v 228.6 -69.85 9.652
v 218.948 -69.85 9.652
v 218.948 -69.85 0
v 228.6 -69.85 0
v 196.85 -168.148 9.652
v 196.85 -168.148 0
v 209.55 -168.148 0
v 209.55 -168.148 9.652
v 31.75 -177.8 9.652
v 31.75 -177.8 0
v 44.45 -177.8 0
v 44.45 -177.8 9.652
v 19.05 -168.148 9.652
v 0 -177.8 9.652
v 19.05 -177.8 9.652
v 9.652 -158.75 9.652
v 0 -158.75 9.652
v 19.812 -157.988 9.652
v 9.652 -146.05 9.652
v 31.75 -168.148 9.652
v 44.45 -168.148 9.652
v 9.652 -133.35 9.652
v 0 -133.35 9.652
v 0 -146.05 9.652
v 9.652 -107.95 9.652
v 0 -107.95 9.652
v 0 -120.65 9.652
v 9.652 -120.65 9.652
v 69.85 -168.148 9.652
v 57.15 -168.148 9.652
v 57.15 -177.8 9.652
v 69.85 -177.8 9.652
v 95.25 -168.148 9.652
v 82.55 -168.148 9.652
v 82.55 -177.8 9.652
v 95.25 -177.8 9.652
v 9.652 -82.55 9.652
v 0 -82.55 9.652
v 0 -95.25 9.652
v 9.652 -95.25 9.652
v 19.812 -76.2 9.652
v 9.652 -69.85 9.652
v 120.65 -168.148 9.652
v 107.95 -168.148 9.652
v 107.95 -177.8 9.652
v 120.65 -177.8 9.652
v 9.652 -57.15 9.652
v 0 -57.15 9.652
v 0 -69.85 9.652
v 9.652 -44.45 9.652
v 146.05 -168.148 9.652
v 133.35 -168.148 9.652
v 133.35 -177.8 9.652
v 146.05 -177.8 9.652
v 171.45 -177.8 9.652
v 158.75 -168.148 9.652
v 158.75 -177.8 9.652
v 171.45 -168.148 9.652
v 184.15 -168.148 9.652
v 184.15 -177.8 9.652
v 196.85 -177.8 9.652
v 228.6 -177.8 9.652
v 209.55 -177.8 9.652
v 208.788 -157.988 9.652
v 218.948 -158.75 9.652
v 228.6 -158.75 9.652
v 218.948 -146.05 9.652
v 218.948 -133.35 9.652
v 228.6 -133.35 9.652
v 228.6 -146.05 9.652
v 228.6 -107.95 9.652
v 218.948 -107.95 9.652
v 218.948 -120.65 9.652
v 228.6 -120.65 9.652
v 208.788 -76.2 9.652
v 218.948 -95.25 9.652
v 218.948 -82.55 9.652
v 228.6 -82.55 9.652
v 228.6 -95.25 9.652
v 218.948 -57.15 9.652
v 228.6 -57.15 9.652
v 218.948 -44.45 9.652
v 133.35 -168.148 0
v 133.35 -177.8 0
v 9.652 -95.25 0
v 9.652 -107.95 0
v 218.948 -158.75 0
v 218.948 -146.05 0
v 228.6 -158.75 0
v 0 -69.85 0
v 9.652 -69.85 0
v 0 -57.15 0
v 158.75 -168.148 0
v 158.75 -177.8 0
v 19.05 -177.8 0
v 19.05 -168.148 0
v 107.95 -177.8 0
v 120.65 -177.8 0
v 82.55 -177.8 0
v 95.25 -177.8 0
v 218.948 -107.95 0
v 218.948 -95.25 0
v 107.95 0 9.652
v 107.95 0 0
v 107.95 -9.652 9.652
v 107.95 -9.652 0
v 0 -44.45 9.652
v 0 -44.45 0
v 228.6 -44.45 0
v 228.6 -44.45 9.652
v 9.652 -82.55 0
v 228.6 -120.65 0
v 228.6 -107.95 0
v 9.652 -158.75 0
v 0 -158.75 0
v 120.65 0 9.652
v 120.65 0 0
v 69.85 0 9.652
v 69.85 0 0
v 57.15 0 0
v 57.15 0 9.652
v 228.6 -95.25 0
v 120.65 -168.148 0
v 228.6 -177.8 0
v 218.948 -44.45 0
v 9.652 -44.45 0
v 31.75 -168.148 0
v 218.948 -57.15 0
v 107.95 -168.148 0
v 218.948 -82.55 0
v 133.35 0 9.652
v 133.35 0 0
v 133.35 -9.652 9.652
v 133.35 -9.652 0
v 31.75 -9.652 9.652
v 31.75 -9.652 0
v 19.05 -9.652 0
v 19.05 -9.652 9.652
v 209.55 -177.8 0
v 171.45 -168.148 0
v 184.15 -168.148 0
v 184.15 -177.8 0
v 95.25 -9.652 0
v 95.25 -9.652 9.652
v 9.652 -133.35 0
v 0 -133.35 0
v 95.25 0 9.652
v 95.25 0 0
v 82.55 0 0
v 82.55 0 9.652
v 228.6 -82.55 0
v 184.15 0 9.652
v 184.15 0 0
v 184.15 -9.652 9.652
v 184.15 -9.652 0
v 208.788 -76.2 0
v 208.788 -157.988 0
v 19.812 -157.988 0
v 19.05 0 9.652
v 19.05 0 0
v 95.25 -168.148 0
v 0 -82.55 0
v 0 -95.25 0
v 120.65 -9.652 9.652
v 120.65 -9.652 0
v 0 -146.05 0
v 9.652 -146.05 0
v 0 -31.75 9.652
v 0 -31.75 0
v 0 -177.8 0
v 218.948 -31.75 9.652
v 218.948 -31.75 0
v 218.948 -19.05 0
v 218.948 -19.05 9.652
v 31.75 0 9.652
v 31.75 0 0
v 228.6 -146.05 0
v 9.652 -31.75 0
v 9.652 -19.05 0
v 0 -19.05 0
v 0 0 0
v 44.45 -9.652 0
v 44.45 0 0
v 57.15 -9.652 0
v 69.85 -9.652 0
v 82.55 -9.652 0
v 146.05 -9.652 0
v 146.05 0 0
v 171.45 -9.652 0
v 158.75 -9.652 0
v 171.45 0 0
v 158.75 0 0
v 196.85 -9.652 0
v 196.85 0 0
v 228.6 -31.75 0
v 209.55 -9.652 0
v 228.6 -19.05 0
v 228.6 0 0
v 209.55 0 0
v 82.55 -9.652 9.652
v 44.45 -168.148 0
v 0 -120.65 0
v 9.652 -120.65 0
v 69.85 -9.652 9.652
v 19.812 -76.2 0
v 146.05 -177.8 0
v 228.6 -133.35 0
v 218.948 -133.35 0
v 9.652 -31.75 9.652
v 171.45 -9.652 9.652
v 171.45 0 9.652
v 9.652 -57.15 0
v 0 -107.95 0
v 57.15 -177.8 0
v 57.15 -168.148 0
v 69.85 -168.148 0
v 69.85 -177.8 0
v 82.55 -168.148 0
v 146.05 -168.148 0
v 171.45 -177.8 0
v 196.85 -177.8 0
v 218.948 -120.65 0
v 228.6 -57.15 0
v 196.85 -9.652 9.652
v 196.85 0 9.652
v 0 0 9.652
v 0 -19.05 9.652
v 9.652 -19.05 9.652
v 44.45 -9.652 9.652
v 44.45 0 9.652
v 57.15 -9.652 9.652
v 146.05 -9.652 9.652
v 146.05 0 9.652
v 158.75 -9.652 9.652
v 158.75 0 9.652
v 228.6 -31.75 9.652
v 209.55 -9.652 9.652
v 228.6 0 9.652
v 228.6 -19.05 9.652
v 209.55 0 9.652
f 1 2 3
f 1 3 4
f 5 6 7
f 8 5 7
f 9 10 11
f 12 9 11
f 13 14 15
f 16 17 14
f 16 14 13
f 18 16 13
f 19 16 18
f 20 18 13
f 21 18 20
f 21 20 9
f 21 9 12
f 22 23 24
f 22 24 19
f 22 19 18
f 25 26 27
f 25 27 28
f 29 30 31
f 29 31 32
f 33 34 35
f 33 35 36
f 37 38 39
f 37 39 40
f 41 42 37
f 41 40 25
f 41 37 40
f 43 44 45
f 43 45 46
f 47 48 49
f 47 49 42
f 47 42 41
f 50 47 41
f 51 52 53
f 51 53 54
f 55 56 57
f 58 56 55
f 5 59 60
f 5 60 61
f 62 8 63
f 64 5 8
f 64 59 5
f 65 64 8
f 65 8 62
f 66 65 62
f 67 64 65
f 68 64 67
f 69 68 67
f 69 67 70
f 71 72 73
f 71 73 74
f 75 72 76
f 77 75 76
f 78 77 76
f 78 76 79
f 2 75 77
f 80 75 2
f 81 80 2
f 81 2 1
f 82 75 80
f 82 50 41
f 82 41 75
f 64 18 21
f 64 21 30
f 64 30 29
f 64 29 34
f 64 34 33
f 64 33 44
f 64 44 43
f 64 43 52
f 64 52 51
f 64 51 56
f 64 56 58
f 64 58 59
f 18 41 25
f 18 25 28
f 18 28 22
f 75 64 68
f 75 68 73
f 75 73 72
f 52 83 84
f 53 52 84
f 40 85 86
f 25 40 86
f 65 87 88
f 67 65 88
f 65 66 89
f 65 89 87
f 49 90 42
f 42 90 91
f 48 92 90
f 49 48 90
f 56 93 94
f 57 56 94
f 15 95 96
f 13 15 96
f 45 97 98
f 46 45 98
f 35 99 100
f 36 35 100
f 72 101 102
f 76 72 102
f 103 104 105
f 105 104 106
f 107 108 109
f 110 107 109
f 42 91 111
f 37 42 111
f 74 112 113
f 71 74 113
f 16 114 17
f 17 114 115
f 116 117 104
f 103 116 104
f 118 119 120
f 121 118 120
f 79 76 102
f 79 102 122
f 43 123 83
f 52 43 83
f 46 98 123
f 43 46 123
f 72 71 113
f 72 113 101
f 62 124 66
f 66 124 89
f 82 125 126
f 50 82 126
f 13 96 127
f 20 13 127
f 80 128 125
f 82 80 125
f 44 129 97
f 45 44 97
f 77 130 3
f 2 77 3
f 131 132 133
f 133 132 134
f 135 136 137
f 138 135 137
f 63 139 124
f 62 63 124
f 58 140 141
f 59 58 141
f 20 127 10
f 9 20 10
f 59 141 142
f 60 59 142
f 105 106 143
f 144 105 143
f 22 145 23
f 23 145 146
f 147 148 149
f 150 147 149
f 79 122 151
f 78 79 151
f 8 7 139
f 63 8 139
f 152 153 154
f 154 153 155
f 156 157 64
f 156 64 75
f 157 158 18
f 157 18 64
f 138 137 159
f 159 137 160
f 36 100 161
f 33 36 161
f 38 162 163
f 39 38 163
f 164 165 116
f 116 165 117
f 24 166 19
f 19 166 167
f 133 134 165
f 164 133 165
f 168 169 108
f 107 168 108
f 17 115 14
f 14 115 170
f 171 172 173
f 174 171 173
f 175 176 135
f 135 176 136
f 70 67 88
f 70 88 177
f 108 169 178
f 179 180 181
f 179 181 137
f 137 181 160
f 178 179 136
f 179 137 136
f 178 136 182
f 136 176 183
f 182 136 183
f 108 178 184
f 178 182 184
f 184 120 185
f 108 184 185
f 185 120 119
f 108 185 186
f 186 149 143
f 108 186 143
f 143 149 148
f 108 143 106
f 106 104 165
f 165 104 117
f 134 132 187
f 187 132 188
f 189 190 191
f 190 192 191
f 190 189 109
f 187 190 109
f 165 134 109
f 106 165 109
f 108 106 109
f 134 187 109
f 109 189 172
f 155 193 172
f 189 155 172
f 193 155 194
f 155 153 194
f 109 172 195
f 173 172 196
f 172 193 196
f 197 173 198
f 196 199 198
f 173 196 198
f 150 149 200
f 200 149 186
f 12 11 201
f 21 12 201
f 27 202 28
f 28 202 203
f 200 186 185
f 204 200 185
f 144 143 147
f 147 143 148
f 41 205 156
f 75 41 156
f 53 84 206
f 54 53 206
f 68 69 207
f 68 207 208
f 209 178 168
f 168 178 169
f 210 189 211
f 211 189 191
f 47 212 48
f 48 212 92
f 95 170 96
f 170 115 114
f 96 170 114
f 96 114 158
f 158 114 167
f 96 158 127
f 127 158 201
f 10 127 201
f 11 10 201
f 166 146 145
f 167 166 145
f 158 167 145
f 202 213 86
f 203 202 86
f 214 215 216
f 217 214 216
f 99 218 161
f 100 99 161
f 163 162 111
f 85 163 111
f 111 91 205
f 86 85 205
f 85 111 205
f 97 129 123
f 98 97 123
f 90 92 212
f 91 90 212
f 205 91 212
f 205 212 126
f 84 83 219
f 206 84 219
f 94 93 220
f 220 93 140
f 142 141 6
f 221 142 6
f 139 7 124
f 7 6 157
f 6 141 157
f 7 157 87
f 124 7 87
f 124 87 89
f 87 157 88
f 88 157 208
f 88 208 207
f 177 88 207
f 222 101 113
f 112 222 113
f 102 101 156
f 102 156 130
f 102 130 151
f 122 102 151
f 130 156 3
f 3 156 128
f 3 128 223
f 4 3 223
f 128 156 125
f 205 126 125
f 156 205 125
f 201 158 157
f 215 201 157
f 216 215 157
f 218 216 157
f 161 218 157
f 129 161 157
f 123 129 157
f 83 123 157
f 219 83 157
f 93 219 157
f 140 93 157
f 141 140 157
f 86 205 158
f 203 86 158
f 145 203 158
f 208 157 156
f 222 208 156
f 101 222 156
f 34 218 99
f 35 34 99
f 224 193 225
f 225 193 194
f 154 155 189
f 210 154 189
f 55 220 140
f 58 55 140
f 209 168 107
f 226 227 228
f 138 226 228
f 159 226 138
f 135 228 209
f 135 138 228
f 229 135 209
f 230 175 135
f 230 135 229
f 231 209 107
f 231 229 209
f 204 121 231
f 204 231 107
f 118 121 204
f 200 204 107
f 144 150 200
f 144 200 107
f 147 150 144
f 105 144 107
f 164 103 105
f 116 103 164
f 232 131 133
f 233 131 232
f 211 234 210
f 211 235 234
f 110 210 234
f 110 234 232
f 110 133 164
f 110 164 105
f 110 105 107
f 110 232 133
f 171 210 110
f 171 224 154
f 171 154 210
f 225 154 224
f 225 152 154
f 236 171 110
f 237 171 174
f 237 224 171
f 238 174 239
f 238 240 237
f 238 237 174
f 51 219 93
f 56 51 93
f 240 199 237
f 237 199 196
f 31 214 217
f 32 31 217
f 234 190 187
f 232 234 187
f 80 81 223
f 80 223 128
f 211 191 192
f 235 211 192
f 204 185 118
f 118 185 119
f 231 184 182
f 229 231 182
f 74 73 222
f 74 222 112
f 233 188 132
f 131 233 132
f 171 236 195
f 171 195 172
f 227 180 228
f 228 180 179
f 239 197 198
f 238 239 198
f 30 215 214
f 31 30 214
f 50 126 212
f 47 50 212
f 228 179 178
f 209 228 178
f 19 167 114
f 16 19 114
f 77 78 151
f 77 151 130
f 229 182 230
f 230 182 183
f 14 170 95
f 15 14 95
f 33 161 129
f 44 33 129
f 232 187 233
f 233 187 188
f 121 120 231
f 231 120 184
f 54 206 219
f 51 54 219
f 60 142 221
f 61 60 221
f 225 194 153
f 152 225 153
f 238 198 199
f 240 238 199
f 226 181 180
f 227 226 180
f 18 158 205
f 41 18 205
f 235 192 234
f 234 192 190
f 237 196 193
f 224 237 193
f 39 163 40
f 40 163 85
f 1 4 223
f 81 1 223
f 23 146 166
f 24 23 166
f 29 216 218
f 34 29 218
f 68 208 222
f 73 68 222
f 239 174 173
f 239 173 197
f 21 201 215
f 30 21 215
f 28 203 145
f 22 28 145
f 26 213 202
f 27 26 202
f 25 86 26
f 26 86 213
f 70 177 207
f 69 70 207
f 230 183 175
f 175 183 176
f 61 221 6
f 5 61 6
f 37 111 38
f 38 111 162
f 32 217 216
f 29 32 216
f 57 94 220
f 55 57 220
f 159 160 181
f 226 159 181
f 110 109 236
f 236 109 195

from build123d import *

# Parameters (mm, degrees)
F1_DEPTH = 9.652
F0_W     = 188.976
F0_H     = 81.788
F2_DEPTH = 9.652


with BuildPart() as f1:
    # F0 (on Top) → F1 (new body)
    with BuildSketch(Plane.XY):
        Polygon((19.05, 0), (0, 0), (0, -19.05), (9.652, -19.05), (9.652, -31.75), (0, -31.75), (0, -44.45), (9.652, -44.45), (218.948, -44.45), (228.6, -44.45), (228.6, -31.75), (218.948, -31.75), (218.948, -19.05), (228.6, -19.05), (228.6, 0), (209.55, 0), (209.55, -9.652), (196.85, -9.652), (196.85, 0), (184.15, 0), (184.15, -9.652), (171.45, -9.652), (171.45, 0), (158.75, 0), (158.75, -9.652), (146.05, -9.652), (146.05, 0), (133.35, 0), (133.35, -9.652), (120.65, -9.652), (120.65, 0), (107.95, 0), (107.95, -9.652), (95.25, -9.652), (95.25, 0), (82.55, 0), (82.55, -9.652), (69.85, -9.652), (69.85, 0), (57.15, 0), (57.15, -9.652), (44.45, -9.652), (44.45, 0), (31.75, 0), (31.75, -9.652), (19.05, -9.652), align=None)
    extrude(amount=F1_DEPTH)


with BuildPart() as f2:
    # F0 (on Top) → F2 (new body)
    with BuildSketch(Plane.XY):
        Polygon((218.948, -44.45), (9.652, -44.45), (9.652, -57.15), (0, -57.15), (0, -69.85), (9.652, -69.85), (9.652, -82.55), (0, -82.55), (0, -95.25), (9.652, -95.25), (9.652, -107.95), (0, -107.95), (0, -120.65), (9.652, -120.65), (9.652, -133.35), (0, -133.35), (0, -146.05), (9.652, -146.05), (9.652, -158.75), (0, -158.75), (0, -177.8), (19.05, -177.8), (19.05, -168.148), (31.75, -168.148), (31.75, -177.8), (44.45, -177.8), (44.45, -168.148), (57.15, -168.148), (57.15, -177.8), (69.85, -177.8), (69.85, -168.148), (82.55, -168.148), (82.55, -177.8), (95.25, -177.8), (95.25, -168.148), (107.95, -168.148), (107.95, -177.8), (120.65, -177.8), (120.65, -168.148), (133.35, -168.148), (133.35, -177.8), (146.05, -177.8), (146.05, -168.148), (158.75, -168.148), (158.75, -177.8), (171.45, -177.8), (171.45, -168.148), (184.15, -168.148), (184.15, -177.8), (196.85, -177.8), (196.85, -168.148), (209.55, -168.148), (209.55, -177.8), (228.6, -177.8), (228.6, -158.75), (218.948, -158.75), (218.948, -146.05), (228.6, -146.05), (228.6, -133.35), (218.948, -133.35), (218.948, -120.65), (228.6, -120.65), (228.6, -107.95), (218.948, -107.95), (218.948, -95.25), (228.6, -95.25), (228.6, -82.55), (218.948, -82.55), (218.948, -69.85), (228.6, -69.85), (228.6, -57.15), (218.948, -57.15), align=None)
        with Locations((114.3, -117.094)):
            Rectangle(F0_W, F0_H, mode=Mode.SUBTRACT)
    extrude(amount=F2_DEPTH)


solid = Compound([f1.part, f2.part])
